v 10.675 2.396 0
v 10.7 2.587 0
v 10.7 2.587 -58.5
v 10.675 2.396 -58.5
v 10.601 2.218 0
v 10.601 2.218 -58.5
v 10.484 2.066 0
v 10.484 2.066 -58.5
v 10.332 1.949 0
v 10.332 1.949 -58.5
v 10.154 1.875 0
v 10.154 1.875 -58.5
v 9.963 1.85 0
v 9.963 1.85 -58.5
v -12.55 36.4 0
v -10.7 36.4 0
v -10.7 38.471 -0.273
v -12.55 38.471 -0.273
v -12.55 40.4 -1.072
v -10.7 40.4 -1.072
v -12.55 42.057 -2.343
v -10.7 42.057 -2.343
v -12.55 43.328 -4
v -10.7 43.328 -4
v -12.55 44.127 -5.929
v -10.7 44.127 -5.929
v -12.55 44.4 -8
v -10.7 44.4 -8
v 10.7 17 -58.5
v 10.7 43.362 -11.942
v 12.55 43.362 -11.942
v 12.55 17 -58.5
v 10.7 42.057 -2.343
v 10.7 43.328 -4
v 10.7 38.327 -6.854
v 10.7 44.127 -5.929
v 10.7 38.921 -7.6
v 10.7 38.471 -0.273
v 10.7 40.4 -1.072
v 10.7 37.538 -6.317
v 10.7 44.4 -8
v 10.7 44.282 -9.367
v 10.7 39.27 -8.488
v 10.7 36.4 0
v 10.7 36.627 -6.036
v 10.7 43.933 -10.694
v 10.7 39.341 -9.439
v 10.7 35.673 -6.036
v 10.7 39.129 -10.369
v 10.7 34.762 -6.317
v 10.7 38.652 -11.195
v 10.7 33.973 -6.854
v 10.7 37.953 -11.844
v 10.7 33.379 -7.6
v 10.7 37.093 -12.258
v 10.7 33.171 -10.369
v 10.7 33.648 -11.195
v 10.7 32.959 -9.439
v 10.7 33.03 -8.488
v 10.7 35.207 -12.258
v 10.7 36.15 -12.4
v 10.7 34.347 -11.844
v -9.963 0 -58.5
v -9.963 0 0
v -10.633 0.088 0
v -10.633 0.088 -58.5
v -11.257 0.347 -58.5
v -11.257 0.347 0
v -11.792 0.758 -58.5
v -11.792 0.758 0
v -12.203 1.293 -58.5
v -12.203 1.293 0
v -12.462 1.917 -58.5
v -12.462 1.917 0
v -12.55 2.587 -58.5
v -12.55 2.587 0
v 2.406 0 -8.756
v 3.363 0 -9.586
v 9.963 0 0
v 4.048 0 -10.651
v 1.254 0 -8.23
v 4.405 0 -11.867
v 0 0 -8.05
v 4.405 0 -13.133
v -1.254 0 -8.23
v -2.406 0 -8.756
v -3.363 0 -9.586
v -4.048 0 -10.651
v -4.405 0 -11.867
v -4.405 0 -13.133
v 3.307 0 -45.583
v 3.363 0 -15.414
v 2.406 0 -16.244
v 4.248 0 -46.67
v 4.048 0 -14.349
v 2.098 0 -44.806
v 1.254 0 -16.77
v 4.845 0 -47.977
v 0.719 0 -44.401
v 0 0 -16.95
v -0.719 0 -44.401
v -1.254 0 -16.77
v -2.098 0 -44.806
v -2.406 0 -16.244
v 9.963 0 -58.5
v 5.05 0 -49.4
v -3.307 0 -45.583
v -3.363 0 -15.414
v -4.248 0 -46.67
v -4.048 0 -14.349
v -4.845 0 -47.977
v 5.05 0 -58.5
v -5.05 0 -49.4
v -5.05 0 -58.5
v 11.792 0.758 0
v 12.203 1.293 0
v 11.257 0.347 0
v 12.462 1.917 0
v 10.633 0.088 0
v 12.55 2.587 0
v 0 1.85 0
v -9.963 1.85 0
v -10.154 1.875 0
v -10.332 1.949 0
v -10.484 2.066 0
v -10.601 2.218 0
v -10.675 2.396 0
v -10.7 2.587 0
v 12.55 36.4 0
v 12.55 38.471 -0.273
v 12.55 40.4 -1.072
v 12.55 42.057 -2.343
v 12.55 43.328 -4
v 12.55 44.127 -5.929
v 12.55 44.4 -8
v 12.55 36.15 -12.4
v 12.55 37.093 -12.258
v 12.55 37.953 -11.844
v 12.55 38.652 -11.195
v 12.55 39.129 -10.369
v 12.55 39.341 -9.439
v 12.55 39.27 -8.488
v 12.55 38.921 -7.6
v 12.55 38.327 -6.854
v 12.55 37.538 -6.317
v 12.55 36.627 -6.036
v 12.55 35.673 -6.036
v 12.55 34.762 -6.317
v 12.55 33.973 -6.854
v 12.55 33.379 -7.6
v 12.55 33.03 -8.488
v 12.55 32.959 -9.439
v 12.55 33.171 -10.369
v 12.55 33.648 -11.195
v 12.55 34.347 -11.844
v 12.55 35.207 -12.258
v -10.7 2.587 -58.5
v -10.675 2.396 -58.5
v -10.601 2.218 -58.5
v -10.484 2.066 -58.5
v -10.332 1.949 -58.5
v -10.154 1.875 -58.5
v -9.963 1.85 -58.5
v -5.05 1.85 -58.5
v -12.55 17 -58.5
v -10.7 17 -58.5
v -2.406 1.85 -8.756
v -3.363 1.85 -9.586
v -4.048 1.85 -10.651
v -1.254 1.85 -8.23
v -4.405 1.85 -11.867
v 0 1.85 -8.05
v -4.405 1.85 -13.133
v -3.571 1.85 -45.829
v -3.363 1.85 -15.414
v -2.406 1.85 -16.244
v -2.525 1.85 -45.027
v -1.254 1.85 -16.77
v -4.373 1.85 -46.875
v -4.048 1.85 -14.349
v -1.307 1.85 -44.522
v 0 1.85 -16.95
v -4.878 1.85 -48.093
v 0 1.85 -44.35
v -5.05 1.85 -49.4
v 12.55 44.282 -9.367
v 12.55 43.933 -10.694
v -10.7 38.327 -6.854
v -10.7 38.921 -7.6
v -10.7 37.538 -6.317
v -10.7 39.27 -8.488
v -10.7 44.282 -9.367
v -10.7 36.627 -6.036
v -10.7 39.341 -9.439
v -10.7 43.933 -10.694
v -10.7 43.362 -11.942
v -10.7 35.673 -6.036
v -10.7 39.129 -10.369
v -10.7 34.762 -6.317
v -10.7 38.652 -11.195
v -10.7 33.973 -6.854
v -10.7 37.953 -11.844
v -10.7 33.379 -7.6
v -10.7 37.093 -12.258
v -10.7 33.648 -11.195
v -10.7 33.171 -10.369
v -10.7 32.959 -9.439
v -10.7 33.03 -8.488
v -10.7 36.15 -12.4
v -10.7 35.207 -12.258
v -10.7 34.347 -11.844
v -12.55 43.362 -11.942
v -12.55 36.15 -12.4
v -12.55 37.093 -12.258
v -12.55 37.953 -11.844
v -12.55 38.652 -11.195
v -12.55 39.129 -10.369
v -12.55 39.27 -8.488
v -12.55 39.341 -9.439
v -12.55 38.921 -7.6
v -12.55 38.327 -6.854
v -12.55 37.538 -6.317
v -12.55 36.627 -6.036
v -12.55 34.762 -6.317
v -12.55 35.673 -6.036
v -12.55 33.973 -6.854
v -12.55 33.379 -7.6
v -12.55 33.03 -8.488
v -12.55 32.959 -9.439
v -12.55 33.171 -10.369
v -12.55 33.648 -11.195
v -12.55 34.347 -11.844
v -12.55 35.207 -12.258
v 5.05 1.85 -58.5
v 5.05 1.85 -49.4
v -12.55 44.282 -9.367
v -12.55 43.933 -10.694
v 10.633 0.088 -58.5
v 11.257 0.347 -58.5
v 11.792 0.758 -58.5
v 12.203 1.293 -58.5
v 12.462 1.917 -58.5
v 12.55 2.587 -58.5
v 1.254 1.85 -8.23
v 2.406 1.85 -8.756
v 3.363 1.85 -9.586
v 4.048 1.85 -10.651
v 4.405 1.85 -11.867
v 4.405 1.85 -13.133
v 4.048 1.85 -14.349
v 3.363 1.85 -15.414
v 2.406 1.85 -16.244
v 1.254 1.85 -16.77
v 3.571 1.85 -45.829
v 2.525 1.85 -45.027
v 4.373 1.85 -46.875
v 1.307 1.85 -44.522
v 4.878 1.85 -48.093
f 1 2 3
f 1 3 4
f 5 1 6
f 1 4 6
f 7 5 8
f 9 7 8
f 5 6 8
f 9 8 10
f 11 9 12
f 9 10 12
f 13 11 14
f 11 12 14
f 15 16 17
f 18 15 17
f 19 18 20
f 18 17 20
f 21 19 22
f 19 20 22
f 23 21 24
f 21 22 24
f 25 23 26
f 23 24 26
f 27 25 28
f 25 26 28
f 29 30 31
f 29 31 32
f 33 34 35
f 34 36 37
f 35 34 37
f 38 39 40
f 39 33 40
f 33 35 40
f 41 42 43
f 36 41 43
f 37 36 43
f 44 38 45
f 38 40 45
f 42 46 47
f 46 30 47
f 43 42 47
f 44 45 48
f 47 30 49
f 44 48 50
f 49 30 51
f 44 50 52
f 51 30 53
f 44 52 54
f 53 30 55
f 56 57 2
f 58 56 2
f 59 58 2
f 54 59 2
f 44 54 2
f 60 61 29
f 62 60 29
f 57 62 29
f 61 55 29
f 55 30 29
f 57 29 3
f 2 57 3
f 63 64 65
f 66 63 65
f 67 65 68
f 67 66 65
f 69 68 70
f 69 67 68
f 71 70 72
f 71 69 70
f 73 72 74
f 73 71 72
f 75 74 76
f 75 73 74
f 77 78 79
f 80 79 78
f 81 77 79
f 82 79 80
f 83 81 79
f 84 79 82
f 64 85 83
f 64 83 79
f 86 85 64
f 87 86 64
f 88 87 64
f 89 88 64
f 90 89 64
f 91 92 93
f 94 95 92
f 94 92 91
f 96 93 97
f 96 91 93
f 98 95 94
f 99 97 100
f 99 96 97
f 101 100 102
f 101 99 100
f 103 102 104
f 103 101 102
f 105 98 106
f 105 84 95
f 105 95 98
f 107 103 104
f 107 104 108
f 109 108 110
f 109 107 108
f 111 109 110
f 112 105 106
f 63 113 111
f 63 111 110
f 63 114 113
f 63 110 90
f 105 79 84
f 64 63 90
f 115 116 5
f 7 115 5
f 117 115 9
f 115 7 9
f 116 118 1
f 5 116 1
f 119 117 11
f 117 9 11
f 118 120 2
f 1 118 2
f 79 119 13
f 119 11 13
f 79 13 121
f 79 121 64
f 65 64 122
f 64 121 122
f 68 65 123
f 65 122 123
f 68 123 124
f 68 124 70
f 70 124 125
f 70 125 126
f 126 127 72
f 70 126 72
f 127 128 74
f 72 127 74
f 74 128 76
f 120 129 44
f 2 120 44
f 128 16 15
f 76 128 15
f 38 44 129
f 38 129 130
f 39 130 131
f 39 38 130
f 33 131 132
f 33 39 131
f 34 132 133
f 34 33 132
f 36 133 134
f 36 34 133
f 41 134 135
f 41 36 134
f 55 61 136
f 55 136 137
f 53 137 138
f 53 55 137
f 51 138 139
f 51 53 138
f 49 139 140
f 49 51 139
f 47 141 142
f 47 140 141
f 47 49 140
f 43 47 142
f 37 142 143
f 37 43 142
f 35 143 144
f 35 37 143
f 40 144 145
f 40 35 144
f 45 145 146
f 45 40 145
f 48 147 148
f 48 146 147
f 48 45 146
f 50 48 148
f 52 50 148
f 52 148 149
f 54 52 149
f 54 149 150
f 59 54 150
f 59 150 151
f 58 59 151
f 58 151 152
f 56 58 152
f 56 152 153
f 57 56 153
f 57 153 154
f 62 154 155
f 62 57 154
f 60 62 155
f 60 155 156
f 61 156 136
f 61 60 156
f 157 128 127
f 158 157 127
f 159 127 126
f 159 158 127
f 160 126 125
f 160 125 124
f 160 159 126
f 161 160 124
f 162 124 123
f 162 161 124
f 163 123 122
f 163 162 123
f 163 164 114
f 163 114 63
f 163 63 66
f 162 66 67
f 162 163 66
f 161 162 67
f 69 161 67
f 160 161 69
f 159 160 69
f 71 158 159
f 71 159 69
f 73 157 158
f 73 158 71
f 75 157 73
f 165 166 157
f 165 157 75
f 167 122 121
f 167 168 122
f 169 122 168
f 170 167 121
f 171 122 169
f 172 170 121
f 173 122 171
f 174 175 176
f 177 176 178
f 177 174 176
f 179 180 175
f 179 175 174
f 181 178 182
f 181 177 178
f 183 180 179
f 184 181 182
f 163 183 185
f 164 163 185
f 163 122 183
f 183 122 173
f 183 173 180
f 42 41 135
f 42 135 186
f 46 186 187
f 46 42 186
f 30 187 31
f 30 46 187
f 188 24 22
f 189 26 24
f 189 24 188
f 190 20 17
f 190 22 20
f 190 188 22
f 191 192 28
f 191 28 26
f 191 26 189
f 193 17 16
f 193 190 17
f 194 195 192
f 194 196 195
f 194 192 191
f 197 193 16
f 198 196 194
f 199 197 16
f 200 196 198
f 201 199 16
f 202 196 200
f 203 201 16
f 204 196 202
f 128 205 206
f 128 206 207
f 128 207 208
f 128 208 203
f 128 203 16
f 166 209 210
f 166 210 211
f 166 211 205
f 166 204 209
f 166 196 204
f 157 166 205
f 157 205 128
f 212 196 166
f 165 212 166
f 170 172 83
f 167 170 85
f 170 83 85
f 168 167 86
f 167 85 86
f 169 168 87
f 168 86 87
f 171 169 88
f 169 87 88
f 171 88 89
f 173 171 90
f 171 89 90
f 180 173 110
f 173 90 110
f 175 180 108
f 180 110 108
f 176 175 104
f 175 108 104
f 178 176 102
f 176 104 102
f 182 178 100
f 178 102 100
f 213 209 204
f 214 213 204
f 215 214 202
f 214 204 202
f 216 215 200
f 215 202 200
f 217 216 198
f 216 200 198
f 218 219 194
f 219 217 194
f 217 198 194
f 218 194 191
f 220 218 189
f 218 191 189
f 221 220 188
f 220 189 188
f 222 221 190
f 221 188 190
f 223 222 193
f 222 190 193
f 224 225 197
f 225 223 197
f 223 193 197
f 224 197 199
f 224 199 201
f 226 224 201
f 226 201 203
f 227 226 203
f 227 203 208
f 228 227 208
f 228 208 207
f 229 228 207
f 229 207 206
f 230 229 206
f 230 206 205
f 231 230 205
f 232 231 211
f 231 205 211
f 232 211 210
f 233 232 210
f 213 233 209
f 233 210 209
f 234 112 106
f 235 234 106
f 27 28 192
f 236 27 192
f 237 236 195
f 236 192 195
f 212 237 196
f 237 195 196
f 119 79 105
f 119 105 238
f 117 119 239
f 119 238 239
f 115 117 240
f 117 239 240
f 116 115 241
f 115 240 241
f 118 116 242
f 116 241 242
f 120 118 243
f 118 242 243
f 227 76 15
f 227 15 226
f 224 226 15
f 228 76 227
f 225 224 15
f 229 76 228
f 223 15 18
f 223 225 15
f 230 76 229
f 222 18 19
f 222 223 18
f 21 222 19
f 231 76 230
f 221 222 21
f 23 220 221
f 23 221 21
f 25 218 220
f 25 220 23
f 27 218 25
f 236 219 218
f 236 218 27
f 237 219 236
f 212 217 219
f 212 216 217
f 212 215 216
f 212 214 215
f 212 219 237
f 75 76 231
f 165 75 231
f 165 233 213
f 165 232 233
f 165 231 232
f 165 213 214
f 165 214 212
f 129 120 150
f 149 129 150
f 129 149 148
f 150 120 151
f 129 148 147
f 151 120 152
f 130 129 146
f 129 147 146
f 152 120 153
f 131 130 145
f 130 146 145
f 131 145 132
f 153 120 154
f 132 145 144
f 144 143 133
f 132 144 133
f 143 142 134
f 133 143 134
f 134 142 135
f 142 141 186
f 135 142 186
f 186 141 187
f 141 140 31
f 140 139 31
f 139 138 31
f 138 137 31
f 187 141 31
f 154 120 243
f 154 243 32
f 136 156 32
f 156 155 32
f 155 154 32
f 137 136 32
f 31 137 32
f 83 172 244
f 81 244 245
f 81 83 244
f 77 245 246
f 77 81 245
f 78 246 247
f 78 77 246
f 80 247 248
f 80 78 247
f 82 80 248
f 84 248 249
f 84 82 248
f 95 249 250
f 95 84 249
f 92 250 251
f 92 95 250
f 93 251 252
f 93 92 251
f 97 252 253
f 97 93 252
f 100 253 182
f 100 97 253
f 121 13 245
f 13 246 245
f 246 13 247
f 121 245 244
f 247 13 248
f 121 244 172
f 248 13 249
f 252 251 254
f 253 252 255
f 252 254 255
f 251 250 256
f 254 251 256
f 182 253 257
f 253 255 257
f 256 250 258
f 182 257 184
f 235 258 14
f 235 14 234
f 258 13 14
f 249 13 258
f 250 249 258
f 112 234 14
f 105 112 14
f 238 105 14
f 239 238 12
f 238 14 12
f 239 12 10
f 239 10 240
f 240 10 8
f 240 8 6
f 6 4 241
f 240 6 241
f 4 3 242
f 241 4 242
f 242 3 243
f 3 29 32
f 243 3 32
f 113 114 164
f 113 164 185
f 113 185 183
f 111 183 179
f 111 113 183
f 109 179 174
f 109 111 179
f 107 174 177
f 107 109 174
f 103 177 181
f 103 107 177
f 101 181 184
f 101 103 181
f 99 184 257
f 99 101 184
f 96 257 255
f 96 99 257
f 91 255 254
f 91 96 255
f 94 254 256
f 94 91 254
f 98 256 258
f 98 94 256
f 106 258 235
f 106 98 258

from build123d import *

# Parameters (mm, degrees)
BASE_FLANGE1_START = -58.5
BASE_FLANGE1_DEPTH = 58.5
SKETCH7_R          = 3.2
CUT_EXTRUDE1_DEPTH = 75.505788366
SKETCH8_R          = 4.45
CUT_EXTRUDE2_DEPTH = 75.505788366


# Read off the part's stored shape, not the designer's step: Base-Flange1
with BuildPart() as part:
    # Base-Flange1 outline → Base-Flange1 (new body)
    with BuildSketch(Plane.XY.offset(BASE_FLANGE1_START)):
        with BuildLine():
            ThreePointArc((9.9634, 0), (11.7924024, 0.7575976), (12.55, 2.5866))
            Line((12.55, 2.5866), (12.55, 44.4))
            Line((12.55, 44.4), (10.7, 44.4))
            Line((10.7, 44.4), (10.7, 2.5866))
            ThreePointArc((10.7, 2.5866), (10.484254855, 2.065745145), (9.9634, 1.85))
            Line((9.9634, 1.85), (0, 1.85))
            Line((0, 1.85), (0, 0))
            Line((0, 0), (9.9634, 0))
        make_face()
    extrude(amount=BASE_FLANGE1_DEPTH)

    # Sketch7 → Cut-Extrude1 (cut, through all)
    with BuildSketch(Plane(origin=(0, 0, 0), x_dir=(0, 0, -1), z_dir=(1, 0, 0))):
        with BuildLine():
            Line((11.941667032, 43.361555933), (58.5, 17))
            Line((58.5, 17), (58.5, 44.4))
            Line((58.5, 44.4), (8, 44.4))
            ThreePointArc((8, 44.4), (10.038081516, 44.136034109), (11.941667032, 43.361555933))
        make_face()
        with BuildLine():
            ThreePointArc((0, 36.4), (2.343145751, 42.056854249), (8, 44.4))
            Line((8, 44.4), (0, 44.4))
            Line((0, 44.4), (0, 36.4))
        make_face()
        with Locations((9.2, 36.15)):
            Circle(SKETCH7_R)
    extrude(amount=CUT_EXTRUDE1_DEPTH, mode=Mode.SUBTRACT)

    # Sketch8 → Cut-Extrude2 (cut, through all)
    with BuildSketch(Plane(origin=(0, 0, 0), x_dir=(1, 0, 0), z_dir=(0, 1, 0))):
        with Locations((0, 12.5)):
            Circle(SKETCH8_R)
        with BuildLine():
            Line((-5.05, 49.4), (-5.05, 58.5))
            ThreePointArc((-5.05, 58.5), (0, 63.55), (5.05, 58.5))
            Line((5.05, 58.5), (5.05, 49.4))
            ThreePointArc((5.05, 49.4), (0, 44.35), (-5.05, 49.4))
        make_face()
    extrude(amount=CUT_EXTRUDE2_DEPTH, mode=Mode.SUBTRACT)

    # Mirror1: part across plane


with BuildPart() as part_1:
    add(part.part)
    add(part.part.mirror(Plane(origin=(0, 0, -58.5), x_dir=(0, 0, 1), z_dir=(1, 0, 0))))


solid = part_1.part
